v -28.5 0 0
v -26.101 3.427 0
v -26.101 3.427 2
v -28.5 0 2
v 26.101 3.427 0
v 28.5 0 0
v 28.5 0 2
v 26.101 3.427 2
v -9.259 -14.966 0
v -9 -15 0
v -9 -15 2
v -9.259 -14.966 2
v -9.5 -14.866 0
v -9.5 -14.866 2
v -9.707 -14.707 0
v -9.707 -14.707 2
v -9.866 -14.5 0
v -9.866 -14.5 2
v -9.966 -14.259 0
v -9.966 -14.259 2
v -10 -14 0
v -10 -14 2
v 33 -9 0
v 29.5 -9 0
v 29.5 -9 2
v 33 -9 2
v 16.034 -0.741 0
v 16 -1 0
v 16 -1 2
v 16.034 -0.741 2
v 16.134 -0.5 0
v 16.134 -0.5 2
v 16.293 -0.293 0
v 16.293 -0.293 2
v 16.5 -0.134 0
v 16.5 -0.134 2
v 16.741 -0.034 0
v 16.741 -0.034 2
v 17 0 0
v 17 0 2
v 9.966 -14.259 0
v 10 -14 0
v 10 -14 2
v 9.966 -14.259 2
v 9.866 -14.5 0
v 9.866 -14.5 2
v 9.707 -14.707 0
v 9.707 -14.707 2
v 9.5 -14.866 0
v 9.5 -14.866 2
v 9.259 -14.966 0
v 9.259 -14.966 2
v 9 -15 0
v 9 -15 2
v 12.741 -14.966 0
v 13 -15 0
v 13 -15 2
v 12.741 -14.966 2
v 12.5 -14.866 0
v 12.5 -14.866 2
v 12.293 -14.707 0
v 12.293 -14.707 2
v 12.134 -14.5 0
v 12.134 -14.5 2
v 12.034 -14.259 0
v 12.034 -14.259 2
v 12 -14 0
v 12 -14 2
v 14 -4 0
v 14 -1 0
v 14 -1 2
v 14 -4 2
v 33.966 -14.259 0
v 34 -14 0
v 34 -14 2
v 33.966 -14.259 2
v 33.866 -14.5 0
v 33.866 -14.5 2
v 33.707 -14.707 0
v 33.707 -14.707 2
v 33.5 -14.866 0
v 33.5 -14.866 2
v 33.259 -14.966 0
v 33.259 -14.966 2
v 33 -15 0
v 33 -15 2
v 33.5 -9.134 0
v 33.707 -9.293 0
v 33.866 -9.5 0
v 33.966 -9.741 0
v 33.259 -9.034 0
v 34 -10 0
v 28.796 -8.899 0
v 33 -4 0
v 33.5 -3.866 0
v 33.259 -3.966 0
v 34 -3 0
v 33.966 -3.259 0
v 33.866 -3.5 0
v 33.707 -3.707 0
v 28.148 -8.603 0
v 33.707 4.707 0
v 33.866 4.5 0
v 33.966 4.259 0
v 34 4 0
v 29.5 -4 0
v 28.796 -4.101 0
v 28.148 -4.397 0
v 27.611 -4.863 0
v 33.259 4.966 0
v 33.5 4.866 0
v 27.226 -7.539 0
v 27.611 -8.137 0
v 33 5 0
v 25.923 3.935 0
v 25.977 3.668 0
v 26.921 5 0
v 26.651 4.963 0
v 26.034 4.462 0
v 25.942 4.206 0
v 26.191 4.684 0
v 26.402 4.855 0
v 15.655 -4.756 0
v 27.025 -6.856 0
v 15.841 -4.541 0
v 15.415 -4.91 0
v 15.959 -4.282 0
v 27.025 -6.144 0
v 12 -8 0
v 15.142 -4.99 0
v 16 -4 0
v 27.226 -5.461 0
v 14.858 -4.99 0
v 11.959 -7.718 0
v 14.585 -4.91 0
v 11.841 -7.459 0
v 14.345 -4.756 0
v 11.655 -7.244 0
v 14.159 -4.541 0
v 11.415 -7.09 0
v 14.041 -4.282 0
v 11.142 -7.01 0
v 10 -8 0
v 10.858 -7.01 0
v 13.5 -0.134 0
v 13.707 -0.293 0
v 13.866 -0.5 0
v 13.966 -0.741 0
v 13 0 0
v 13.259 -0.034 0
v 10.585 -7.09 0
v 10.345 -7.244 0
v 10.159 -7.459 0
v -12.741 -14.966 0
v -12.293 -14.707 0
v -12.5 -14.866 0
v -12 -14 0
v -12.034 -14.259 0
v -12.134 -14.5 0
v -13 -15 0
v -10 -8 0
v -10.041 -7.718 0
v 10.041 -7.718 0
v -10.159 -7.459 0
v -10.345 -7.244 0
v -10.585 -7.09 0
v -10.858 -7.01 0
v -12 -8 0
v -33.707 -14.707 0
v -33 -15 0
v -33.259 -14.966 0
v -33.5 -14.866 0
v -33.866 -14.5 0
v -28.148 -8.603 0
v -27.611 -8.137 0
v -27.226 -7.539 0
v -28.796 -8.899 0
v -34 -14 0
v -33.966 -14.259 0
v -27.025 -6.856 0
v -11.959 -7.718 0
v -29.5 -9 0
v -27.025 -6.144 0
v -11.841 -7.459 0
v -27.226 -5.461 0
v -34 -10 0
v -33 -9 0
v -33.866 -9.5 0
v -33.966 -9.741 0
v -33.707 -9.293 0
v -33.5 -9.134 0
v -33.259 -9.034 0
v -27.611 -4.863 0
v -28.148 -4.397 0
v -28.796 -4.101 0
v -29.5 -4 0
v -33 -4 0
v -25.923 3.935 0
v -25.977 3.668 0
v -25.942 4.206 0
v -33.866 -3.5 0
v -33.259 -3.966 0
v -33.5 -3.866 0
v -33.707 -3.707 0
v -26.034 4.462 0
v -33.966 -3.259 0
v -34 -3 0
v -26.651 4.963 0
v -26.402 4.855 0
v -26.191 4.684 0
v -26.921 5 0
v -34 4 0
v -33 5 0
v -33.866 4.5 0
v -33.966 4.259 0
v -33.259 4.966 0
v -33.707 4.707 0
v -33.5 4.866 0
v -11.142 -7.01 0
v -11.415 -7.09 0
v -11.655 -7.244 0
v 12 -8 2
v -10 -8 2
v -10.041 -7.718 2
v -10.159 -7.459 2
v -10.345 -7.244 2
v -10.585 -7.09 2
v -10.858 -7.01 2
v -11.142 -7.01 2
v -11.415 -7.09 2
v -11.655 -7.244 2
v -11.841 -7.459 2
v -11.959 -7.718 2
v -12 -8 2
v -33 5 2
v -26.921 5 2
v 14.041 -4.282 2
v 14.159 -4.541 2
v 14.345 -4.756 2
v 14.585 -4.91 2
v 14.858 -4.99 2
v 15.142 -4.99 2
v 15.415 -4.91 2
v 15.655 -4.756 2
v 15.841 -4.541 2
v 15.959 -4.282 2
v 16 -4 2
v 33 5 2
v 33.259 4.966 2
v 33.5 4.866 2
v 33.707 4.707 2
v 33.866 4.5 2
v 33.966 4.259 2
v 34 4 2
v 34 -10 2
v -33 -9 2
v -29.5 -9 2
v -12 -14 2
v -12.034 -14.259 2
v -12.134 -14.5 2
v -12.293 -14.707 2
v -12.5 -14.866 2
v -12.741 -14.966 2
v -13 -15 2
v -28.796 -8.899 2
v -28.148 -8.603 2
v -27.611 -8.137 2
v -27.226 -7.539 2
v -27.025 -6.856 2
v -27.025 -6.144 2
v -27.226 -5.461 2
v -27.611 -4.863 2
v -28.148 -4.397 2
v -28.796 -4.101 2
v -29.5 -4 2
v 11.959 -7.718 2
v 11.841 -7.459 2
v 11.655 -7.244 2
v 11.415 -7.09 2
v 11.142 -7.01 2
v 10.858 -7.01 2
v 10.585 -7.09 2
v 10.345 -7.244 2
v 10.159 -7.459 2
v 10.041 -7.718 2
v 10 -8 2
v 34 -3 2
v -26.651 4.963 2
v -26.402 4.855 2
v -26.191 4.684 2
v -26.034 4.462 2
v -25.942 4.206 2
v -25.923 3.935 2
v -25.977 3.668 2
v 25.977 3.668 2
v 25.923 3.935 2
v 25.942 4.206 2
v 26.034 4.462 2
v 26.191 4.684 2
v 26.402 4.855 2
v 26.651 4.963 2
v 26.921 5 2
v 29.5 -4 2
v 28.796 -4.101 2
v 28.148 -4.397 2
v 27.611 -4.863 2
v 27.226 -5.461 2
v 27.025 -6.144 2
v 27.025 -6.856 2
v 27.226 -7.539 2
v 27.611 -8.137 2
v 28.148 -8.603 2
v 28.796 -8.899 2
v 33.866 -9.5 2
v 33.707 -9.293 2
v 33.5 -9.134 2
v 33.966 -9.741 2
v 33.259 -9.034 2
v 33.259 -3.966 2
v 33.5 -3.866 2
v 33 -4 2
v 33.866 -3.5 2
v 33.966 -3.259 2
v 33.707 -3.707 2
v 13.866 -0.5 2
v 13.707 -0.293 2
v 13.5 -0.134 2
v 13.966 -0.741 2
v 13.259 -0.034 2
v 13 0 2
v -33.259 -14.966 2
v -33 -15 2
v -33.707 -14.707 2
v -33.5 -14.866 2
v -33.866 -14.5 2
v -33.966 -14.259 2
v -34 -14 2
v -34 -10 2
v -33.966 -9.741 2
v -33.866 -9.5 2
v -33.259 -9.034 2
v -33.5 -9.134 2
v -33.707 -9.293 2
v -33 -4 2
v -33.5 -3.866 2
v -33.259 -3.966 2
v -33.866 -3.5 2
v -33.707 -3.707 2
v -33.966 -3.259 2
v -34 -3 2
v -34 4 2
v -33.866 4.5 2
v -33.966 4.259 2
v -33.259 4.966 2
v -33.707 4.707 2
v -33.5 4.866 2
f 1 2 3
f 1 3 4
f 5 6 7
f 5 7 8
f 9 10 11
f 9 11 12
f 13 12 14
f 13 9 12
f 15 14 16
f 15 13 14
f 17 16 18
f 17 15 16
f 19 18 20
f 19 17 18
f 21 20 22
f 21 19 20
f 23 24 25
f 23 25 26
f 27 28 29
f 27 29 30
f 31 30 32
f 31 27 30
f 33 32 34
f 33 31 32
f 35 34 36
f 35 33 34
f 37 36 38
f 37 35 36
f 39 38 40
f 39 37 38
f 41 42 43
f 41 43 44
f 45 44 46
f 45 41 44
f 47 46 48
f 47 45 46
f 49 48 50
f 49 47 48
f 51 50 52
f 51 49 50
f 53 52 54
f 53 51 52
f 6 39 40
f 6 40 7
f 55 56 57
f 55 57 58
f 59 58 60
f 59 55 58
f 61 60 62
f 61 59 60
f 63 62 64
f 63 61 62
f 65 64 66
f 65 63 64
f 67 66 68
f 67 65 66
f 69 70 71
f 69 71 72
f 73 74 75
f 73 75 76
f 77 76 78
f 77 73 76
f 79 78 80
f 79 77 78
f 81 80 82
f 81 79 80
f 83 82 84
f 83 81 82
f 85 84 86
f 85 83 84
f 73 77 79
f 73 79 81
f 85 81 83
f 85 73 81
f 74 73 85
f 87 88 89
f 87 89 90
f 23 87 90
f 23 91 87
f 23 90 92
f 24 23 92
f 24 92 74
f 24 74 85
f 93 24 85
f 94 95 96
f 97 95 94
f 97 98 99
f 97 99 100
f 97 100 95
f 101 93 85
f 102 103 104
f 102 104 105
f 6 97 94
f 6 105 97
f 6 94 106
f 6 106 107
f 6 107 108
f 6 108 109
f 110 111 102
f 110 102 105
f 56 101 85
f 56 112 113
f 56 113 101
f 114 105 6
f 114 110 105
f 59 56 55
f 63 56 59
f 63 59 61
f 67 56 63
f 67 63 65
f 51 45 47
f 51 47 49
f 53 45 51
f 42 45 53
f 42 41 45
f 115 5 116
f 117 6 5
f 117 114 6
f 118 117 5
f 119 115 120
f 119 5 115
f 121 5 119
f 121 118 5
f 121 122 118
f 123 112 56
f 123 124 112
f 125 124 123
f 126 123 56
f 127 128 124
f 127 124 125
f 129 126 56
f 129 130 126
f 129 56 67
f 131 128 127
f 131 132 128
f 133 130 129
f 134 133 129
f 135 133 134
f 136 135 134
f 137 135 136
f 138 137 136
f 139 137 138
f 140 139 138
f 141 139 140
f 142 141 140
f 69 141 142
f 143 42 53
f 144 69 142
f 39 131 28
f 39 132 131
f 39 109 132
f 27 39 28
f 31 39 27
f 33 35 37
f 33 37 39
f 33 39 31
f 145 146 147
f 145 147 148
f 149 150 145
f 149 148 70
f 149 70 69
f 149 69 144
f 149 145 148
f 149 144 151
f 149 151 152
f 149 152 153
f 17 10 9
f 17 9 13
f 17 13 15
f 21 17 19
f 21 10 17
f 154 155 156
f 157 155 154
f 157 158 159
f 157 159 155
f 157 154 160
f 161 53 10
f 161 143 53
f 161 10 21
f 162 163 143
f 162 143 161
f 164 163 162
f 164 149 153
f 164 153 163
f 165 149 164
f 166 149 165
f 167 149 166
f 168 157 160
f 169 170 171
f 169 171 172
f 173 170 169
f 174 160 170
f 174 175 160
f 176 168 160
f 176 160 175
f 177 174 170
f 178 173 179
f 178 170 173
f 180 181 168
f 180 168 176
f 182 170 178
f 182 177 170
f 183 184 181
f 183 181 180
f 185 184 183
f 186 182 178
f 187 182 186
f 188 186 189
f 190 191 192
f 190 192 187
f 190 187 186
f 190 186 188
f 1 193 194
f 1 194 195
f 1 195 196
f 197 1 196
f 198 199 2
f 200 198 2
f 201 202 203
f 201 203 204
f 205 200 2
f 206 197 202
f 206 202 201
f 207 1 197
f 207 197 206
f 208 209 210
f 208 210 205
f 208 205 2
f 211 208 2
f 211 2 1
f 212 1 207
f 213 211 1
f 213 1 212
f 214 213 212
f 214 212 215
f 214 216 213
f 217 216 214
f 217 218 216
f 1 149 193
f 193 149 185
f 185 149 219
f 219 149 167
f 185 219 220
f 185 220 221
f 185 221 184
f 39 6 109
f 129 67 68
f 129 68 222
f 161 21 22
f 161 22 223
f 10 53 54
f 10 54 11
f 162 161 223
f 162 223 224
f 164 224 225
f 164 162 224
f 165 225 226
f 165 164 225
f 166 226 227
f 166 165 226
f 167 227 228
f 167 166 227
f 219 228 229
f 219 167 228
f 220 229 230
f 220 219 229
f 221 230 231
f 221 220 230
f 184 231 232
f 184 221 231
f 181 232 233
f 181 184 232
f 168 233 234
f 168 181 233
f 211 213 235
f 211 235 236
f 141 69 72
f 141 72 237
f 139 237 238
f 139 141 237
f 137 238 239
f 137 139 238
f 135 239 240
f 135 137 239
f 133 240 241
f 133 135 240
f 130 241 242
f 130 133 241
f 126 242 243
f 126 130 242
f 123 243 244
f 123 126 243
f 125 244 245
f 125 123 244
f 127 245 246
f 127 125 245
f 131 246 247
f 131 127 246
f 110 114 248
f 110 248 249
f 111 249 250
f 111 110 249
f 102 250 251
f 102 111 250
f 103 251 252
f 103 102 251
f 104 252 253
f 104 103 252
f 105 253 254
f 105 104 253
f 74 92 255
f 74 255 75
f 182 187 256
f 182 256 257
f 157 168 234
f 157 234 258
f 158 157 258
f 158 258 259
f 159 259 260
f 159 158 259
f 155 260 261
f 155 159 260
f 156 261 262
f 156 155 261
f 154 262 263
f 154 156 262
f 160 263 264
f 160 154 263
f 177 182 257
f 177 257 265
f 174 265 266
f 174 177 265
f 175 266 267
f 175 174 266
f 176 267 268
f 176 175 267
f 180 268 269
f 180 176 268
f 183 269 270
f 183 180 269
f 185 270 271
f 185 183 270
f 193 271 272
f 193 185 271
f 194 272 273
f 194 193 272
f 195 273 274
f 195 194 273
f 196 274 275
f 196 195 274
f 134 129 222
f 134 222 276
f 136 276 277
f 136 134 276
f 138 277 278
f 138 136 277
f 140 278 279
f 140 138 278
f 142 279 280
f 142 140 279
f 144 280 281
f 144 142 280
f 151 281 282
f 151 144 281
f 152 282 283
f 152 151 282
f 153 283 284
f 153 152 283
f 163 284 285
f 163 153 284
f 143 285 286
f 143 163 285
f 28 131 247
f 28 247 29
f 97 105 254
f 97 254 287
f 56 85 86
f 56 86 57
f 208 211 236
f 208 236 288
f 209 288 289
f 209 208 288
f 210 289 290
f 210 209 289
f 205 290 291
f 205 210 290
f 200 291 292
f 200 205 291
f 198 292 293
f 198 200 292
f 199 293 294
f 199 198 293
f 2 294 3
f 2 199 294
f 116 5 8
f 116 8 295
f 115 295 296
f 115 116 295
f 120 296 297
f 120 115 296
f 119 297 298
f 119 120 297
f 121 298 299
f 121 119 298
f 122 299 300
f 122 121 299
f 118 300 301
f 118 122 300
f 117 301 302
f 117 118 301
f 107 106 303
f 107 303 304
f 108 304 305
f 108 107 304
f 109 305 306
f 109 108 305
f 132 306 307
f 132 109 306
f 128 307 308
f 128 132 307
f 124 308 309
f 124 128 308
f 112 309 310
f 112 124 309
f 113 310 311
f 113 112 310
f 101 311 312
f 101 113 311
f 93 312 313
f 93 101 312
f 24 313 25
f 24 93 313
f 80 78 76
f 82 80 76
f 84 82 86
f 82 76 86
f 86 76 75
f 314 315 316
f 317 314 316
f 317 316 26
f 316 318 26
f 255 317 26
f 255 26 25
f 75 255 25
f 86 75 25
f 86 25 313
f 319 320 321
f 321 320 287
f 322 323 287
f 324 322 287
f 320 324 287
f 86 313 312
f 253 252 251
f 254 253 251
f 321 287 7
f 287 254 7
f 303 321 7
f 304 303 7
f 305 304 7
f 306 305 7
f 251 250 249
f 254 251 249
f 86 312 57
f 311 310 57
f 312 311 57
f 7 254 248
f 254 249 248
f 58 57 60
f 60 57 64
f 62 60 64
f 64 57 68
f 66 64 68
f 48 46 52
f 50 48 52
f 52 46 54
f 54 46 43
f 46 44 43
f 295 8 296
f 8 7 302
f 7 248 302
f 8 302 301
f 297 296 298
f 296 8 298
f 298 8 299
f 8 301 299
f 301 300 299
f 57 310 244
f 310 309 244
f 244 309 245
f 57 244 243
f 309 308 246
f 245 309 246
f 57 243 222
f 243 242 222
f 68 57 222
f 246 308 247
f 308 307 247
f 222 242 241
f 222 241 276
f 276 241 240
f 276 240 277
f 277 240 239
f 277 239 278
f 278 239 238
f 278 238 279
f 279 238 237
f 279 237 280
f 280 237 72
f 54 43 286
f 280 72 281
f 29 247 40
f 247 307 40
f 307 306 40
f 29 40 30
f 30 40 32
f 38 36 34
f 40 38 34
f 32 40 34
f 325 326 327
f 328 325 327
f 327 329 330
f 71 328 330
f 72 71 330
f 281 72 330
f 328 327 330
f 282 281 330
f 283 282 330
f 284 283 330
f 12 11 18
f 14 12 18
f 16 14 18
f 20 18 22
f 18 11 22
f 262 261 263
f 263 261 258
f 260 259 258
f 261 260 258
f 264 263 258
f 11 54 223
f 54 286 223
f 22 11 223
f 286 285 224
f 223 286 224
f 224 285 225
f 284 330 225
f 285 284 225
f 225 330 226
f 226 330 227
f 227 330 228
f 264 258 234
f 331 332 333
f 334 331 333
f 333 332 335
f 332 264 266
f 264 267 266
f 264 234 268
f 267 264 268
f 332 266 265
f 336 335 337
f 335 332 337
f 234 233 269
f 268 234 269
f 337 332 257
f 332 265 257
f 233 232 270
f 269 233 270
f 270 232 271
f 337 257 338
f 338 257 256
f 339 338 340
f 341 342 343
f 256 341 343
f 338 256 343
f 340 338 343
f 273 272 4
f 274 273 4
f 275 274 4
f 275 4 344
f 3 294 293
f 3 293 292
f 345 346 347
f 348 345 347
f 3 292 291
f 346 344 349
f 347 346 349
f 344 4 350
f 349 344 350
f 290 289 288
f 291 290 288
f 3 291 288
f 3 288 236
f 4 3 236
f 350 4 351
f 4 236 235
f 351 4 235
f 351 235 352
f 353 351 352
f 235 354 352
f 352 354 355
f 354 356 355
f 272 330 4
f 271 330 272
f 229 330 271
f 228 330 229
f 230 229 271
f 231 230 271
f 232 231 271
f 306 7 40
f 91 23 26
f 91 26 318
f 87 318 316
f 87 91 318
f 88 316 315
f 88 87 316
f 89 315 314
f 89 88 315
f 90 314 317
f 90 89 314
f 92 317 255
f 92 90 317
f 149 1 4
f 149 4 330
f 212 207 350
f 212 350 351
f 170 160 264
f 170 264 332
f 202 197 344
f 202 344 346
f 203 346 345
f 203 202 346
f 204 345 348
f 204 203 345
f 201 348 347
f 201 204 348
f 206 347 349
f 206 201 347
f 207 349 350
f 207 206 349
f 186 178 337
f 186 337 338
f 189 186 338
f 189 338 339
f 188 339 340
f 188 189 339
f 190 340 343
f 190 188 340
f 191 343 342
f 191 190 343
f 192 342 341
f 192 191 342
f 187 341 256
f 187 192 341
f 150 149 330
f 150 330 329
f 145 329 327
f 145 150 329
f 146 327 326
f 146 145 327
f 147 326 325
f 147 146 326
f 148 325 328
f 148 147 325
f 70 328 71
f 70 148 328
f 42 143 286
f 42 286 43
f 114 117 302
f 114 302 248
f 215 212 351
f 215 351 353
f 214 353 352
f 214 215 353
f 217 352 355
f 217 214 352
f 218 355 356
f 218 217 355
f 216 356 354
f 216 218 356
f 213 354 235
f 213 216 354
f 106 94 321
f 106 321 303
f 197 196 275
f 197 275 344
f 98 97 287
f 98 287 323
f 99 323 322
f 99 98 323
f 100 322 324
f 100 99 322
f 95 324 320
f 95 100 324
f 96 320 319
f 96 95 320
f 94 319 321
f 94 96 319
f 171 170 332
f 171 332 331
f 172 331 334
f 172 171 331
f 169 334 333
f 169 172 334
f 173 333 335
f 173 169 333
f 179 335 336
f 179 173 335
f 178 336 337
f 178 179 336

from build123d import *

# Parameters (mm, degrees)
RESSALTO_EXTRUS_O1_DEPTH = 2


with BuildPart() as part:
    # Esboço1 → Ressalto-extrusão1 (new body)
    with BuildSketch(Plane.XY):
        with BuildLine():
            Line((-28.5, 0), (13, 0))
            ThreePointArc((13, 0), (13.707106781, -0.292893219), (14, -1))
            Line((14, -1), (14, -4))
            ThreePointArc((14, -4), (15, -5), (16, -4))
            Line((16, -4), (16, -1))
            ThreePointArc((16, -1), (16.292893219, -0.292893219), (17, 0))
            Line((17, 0), (28.5, 0))
            Line((28.5, 0), (26.101423641, 3.426537656))
            ThreePointArc((26.101423641, 3.426537656), (26.033676885, 4.461810381), (26.920655562, 5))
            Line((26.920655562, 5), (33, 5))
            ThreePointArc((33, 5), (33.707106781, 4.707106781), (34, 4))
            Line((34, 4), (34, -3))
            ThreePointArc((34, -3), (33.707106781, -3.707106781), (33, -4))
            Line((33, -4), (29.5, -4))
            ThreePointArc((29.5, -4), (27, -6.5), (29.5, -9))
            Line((29.5, -9), (33, -9))
            ThreePointArc((33, -9), (33.707106781, -9.292893219), (34, -10))
            Line((34, -10), (34, -14))
            ThreePointArc((34, -14), (33.707106781, -14.707106781), (33, -15))
            Line((33, -15), (13, -15))
            ThreePointArc((13, -15), (12.292893219, -14.707106781), (12, -14))
            Line((12, -14), (12, -8))
            ThreePointArc((12, -8), (11, -7), (10, -8))
            Line((10, -8), (10, -14))
            ThreePointArc((10, -14), (9.707106781, -14.707106781), (9, -15))
            Line((9, -15), (-9, -15))
            ThreePointArc((-9, -15), (-9.707106781, -14.707106781), (-10, -14))
            Line((-10, -14), (-10, -8))
            ThreePointArc((-10, -8), (-11, -7), (-12, -8))
            Line((-12, -8), (-12, -14))
            ThreePointArc((-12, -14), (-12.292893219, -14.707106781), (-13, -15))
            Line((-13, -15), (-33, -15))
            ThreePointArc((-33, -15), (-33.707106781, -14.707106781), (-34, -14))
            Line((-34, -14), (-34, -10))
            ThreePointArc((-34, -10), (-33.707106781, -9.292893219), (-33, -9))
            Line((-33, -9), (-29.5, -9))
            ThreePointArc((-29.5, -9), (-27, -6.5), (-29.5, -4))
            Line((-29.5, -4), (-33, -4))
            ThreePointArc((-33, -4), (-33.707106781, -3.707106781), (-34, -3))
            Line((-34, -3), (-34, 4))
            ThreePointArc((-34, 4), (-33.707106781, 4.707106781), (-33, 5))
            Line((-33, 5), (-26.920655562, 5))
            ThreePointArc((-26.920655562, 5), (-26.033676885, 4.461810381), (-26.101423641, 3.426537656))
            Line((-26.101423641, 3.426537656), (-28.5, 0))
        make_face()
    extrude(amount=RESSALTO_EXTRUS_O1_DEPTH)


solid = part.part
